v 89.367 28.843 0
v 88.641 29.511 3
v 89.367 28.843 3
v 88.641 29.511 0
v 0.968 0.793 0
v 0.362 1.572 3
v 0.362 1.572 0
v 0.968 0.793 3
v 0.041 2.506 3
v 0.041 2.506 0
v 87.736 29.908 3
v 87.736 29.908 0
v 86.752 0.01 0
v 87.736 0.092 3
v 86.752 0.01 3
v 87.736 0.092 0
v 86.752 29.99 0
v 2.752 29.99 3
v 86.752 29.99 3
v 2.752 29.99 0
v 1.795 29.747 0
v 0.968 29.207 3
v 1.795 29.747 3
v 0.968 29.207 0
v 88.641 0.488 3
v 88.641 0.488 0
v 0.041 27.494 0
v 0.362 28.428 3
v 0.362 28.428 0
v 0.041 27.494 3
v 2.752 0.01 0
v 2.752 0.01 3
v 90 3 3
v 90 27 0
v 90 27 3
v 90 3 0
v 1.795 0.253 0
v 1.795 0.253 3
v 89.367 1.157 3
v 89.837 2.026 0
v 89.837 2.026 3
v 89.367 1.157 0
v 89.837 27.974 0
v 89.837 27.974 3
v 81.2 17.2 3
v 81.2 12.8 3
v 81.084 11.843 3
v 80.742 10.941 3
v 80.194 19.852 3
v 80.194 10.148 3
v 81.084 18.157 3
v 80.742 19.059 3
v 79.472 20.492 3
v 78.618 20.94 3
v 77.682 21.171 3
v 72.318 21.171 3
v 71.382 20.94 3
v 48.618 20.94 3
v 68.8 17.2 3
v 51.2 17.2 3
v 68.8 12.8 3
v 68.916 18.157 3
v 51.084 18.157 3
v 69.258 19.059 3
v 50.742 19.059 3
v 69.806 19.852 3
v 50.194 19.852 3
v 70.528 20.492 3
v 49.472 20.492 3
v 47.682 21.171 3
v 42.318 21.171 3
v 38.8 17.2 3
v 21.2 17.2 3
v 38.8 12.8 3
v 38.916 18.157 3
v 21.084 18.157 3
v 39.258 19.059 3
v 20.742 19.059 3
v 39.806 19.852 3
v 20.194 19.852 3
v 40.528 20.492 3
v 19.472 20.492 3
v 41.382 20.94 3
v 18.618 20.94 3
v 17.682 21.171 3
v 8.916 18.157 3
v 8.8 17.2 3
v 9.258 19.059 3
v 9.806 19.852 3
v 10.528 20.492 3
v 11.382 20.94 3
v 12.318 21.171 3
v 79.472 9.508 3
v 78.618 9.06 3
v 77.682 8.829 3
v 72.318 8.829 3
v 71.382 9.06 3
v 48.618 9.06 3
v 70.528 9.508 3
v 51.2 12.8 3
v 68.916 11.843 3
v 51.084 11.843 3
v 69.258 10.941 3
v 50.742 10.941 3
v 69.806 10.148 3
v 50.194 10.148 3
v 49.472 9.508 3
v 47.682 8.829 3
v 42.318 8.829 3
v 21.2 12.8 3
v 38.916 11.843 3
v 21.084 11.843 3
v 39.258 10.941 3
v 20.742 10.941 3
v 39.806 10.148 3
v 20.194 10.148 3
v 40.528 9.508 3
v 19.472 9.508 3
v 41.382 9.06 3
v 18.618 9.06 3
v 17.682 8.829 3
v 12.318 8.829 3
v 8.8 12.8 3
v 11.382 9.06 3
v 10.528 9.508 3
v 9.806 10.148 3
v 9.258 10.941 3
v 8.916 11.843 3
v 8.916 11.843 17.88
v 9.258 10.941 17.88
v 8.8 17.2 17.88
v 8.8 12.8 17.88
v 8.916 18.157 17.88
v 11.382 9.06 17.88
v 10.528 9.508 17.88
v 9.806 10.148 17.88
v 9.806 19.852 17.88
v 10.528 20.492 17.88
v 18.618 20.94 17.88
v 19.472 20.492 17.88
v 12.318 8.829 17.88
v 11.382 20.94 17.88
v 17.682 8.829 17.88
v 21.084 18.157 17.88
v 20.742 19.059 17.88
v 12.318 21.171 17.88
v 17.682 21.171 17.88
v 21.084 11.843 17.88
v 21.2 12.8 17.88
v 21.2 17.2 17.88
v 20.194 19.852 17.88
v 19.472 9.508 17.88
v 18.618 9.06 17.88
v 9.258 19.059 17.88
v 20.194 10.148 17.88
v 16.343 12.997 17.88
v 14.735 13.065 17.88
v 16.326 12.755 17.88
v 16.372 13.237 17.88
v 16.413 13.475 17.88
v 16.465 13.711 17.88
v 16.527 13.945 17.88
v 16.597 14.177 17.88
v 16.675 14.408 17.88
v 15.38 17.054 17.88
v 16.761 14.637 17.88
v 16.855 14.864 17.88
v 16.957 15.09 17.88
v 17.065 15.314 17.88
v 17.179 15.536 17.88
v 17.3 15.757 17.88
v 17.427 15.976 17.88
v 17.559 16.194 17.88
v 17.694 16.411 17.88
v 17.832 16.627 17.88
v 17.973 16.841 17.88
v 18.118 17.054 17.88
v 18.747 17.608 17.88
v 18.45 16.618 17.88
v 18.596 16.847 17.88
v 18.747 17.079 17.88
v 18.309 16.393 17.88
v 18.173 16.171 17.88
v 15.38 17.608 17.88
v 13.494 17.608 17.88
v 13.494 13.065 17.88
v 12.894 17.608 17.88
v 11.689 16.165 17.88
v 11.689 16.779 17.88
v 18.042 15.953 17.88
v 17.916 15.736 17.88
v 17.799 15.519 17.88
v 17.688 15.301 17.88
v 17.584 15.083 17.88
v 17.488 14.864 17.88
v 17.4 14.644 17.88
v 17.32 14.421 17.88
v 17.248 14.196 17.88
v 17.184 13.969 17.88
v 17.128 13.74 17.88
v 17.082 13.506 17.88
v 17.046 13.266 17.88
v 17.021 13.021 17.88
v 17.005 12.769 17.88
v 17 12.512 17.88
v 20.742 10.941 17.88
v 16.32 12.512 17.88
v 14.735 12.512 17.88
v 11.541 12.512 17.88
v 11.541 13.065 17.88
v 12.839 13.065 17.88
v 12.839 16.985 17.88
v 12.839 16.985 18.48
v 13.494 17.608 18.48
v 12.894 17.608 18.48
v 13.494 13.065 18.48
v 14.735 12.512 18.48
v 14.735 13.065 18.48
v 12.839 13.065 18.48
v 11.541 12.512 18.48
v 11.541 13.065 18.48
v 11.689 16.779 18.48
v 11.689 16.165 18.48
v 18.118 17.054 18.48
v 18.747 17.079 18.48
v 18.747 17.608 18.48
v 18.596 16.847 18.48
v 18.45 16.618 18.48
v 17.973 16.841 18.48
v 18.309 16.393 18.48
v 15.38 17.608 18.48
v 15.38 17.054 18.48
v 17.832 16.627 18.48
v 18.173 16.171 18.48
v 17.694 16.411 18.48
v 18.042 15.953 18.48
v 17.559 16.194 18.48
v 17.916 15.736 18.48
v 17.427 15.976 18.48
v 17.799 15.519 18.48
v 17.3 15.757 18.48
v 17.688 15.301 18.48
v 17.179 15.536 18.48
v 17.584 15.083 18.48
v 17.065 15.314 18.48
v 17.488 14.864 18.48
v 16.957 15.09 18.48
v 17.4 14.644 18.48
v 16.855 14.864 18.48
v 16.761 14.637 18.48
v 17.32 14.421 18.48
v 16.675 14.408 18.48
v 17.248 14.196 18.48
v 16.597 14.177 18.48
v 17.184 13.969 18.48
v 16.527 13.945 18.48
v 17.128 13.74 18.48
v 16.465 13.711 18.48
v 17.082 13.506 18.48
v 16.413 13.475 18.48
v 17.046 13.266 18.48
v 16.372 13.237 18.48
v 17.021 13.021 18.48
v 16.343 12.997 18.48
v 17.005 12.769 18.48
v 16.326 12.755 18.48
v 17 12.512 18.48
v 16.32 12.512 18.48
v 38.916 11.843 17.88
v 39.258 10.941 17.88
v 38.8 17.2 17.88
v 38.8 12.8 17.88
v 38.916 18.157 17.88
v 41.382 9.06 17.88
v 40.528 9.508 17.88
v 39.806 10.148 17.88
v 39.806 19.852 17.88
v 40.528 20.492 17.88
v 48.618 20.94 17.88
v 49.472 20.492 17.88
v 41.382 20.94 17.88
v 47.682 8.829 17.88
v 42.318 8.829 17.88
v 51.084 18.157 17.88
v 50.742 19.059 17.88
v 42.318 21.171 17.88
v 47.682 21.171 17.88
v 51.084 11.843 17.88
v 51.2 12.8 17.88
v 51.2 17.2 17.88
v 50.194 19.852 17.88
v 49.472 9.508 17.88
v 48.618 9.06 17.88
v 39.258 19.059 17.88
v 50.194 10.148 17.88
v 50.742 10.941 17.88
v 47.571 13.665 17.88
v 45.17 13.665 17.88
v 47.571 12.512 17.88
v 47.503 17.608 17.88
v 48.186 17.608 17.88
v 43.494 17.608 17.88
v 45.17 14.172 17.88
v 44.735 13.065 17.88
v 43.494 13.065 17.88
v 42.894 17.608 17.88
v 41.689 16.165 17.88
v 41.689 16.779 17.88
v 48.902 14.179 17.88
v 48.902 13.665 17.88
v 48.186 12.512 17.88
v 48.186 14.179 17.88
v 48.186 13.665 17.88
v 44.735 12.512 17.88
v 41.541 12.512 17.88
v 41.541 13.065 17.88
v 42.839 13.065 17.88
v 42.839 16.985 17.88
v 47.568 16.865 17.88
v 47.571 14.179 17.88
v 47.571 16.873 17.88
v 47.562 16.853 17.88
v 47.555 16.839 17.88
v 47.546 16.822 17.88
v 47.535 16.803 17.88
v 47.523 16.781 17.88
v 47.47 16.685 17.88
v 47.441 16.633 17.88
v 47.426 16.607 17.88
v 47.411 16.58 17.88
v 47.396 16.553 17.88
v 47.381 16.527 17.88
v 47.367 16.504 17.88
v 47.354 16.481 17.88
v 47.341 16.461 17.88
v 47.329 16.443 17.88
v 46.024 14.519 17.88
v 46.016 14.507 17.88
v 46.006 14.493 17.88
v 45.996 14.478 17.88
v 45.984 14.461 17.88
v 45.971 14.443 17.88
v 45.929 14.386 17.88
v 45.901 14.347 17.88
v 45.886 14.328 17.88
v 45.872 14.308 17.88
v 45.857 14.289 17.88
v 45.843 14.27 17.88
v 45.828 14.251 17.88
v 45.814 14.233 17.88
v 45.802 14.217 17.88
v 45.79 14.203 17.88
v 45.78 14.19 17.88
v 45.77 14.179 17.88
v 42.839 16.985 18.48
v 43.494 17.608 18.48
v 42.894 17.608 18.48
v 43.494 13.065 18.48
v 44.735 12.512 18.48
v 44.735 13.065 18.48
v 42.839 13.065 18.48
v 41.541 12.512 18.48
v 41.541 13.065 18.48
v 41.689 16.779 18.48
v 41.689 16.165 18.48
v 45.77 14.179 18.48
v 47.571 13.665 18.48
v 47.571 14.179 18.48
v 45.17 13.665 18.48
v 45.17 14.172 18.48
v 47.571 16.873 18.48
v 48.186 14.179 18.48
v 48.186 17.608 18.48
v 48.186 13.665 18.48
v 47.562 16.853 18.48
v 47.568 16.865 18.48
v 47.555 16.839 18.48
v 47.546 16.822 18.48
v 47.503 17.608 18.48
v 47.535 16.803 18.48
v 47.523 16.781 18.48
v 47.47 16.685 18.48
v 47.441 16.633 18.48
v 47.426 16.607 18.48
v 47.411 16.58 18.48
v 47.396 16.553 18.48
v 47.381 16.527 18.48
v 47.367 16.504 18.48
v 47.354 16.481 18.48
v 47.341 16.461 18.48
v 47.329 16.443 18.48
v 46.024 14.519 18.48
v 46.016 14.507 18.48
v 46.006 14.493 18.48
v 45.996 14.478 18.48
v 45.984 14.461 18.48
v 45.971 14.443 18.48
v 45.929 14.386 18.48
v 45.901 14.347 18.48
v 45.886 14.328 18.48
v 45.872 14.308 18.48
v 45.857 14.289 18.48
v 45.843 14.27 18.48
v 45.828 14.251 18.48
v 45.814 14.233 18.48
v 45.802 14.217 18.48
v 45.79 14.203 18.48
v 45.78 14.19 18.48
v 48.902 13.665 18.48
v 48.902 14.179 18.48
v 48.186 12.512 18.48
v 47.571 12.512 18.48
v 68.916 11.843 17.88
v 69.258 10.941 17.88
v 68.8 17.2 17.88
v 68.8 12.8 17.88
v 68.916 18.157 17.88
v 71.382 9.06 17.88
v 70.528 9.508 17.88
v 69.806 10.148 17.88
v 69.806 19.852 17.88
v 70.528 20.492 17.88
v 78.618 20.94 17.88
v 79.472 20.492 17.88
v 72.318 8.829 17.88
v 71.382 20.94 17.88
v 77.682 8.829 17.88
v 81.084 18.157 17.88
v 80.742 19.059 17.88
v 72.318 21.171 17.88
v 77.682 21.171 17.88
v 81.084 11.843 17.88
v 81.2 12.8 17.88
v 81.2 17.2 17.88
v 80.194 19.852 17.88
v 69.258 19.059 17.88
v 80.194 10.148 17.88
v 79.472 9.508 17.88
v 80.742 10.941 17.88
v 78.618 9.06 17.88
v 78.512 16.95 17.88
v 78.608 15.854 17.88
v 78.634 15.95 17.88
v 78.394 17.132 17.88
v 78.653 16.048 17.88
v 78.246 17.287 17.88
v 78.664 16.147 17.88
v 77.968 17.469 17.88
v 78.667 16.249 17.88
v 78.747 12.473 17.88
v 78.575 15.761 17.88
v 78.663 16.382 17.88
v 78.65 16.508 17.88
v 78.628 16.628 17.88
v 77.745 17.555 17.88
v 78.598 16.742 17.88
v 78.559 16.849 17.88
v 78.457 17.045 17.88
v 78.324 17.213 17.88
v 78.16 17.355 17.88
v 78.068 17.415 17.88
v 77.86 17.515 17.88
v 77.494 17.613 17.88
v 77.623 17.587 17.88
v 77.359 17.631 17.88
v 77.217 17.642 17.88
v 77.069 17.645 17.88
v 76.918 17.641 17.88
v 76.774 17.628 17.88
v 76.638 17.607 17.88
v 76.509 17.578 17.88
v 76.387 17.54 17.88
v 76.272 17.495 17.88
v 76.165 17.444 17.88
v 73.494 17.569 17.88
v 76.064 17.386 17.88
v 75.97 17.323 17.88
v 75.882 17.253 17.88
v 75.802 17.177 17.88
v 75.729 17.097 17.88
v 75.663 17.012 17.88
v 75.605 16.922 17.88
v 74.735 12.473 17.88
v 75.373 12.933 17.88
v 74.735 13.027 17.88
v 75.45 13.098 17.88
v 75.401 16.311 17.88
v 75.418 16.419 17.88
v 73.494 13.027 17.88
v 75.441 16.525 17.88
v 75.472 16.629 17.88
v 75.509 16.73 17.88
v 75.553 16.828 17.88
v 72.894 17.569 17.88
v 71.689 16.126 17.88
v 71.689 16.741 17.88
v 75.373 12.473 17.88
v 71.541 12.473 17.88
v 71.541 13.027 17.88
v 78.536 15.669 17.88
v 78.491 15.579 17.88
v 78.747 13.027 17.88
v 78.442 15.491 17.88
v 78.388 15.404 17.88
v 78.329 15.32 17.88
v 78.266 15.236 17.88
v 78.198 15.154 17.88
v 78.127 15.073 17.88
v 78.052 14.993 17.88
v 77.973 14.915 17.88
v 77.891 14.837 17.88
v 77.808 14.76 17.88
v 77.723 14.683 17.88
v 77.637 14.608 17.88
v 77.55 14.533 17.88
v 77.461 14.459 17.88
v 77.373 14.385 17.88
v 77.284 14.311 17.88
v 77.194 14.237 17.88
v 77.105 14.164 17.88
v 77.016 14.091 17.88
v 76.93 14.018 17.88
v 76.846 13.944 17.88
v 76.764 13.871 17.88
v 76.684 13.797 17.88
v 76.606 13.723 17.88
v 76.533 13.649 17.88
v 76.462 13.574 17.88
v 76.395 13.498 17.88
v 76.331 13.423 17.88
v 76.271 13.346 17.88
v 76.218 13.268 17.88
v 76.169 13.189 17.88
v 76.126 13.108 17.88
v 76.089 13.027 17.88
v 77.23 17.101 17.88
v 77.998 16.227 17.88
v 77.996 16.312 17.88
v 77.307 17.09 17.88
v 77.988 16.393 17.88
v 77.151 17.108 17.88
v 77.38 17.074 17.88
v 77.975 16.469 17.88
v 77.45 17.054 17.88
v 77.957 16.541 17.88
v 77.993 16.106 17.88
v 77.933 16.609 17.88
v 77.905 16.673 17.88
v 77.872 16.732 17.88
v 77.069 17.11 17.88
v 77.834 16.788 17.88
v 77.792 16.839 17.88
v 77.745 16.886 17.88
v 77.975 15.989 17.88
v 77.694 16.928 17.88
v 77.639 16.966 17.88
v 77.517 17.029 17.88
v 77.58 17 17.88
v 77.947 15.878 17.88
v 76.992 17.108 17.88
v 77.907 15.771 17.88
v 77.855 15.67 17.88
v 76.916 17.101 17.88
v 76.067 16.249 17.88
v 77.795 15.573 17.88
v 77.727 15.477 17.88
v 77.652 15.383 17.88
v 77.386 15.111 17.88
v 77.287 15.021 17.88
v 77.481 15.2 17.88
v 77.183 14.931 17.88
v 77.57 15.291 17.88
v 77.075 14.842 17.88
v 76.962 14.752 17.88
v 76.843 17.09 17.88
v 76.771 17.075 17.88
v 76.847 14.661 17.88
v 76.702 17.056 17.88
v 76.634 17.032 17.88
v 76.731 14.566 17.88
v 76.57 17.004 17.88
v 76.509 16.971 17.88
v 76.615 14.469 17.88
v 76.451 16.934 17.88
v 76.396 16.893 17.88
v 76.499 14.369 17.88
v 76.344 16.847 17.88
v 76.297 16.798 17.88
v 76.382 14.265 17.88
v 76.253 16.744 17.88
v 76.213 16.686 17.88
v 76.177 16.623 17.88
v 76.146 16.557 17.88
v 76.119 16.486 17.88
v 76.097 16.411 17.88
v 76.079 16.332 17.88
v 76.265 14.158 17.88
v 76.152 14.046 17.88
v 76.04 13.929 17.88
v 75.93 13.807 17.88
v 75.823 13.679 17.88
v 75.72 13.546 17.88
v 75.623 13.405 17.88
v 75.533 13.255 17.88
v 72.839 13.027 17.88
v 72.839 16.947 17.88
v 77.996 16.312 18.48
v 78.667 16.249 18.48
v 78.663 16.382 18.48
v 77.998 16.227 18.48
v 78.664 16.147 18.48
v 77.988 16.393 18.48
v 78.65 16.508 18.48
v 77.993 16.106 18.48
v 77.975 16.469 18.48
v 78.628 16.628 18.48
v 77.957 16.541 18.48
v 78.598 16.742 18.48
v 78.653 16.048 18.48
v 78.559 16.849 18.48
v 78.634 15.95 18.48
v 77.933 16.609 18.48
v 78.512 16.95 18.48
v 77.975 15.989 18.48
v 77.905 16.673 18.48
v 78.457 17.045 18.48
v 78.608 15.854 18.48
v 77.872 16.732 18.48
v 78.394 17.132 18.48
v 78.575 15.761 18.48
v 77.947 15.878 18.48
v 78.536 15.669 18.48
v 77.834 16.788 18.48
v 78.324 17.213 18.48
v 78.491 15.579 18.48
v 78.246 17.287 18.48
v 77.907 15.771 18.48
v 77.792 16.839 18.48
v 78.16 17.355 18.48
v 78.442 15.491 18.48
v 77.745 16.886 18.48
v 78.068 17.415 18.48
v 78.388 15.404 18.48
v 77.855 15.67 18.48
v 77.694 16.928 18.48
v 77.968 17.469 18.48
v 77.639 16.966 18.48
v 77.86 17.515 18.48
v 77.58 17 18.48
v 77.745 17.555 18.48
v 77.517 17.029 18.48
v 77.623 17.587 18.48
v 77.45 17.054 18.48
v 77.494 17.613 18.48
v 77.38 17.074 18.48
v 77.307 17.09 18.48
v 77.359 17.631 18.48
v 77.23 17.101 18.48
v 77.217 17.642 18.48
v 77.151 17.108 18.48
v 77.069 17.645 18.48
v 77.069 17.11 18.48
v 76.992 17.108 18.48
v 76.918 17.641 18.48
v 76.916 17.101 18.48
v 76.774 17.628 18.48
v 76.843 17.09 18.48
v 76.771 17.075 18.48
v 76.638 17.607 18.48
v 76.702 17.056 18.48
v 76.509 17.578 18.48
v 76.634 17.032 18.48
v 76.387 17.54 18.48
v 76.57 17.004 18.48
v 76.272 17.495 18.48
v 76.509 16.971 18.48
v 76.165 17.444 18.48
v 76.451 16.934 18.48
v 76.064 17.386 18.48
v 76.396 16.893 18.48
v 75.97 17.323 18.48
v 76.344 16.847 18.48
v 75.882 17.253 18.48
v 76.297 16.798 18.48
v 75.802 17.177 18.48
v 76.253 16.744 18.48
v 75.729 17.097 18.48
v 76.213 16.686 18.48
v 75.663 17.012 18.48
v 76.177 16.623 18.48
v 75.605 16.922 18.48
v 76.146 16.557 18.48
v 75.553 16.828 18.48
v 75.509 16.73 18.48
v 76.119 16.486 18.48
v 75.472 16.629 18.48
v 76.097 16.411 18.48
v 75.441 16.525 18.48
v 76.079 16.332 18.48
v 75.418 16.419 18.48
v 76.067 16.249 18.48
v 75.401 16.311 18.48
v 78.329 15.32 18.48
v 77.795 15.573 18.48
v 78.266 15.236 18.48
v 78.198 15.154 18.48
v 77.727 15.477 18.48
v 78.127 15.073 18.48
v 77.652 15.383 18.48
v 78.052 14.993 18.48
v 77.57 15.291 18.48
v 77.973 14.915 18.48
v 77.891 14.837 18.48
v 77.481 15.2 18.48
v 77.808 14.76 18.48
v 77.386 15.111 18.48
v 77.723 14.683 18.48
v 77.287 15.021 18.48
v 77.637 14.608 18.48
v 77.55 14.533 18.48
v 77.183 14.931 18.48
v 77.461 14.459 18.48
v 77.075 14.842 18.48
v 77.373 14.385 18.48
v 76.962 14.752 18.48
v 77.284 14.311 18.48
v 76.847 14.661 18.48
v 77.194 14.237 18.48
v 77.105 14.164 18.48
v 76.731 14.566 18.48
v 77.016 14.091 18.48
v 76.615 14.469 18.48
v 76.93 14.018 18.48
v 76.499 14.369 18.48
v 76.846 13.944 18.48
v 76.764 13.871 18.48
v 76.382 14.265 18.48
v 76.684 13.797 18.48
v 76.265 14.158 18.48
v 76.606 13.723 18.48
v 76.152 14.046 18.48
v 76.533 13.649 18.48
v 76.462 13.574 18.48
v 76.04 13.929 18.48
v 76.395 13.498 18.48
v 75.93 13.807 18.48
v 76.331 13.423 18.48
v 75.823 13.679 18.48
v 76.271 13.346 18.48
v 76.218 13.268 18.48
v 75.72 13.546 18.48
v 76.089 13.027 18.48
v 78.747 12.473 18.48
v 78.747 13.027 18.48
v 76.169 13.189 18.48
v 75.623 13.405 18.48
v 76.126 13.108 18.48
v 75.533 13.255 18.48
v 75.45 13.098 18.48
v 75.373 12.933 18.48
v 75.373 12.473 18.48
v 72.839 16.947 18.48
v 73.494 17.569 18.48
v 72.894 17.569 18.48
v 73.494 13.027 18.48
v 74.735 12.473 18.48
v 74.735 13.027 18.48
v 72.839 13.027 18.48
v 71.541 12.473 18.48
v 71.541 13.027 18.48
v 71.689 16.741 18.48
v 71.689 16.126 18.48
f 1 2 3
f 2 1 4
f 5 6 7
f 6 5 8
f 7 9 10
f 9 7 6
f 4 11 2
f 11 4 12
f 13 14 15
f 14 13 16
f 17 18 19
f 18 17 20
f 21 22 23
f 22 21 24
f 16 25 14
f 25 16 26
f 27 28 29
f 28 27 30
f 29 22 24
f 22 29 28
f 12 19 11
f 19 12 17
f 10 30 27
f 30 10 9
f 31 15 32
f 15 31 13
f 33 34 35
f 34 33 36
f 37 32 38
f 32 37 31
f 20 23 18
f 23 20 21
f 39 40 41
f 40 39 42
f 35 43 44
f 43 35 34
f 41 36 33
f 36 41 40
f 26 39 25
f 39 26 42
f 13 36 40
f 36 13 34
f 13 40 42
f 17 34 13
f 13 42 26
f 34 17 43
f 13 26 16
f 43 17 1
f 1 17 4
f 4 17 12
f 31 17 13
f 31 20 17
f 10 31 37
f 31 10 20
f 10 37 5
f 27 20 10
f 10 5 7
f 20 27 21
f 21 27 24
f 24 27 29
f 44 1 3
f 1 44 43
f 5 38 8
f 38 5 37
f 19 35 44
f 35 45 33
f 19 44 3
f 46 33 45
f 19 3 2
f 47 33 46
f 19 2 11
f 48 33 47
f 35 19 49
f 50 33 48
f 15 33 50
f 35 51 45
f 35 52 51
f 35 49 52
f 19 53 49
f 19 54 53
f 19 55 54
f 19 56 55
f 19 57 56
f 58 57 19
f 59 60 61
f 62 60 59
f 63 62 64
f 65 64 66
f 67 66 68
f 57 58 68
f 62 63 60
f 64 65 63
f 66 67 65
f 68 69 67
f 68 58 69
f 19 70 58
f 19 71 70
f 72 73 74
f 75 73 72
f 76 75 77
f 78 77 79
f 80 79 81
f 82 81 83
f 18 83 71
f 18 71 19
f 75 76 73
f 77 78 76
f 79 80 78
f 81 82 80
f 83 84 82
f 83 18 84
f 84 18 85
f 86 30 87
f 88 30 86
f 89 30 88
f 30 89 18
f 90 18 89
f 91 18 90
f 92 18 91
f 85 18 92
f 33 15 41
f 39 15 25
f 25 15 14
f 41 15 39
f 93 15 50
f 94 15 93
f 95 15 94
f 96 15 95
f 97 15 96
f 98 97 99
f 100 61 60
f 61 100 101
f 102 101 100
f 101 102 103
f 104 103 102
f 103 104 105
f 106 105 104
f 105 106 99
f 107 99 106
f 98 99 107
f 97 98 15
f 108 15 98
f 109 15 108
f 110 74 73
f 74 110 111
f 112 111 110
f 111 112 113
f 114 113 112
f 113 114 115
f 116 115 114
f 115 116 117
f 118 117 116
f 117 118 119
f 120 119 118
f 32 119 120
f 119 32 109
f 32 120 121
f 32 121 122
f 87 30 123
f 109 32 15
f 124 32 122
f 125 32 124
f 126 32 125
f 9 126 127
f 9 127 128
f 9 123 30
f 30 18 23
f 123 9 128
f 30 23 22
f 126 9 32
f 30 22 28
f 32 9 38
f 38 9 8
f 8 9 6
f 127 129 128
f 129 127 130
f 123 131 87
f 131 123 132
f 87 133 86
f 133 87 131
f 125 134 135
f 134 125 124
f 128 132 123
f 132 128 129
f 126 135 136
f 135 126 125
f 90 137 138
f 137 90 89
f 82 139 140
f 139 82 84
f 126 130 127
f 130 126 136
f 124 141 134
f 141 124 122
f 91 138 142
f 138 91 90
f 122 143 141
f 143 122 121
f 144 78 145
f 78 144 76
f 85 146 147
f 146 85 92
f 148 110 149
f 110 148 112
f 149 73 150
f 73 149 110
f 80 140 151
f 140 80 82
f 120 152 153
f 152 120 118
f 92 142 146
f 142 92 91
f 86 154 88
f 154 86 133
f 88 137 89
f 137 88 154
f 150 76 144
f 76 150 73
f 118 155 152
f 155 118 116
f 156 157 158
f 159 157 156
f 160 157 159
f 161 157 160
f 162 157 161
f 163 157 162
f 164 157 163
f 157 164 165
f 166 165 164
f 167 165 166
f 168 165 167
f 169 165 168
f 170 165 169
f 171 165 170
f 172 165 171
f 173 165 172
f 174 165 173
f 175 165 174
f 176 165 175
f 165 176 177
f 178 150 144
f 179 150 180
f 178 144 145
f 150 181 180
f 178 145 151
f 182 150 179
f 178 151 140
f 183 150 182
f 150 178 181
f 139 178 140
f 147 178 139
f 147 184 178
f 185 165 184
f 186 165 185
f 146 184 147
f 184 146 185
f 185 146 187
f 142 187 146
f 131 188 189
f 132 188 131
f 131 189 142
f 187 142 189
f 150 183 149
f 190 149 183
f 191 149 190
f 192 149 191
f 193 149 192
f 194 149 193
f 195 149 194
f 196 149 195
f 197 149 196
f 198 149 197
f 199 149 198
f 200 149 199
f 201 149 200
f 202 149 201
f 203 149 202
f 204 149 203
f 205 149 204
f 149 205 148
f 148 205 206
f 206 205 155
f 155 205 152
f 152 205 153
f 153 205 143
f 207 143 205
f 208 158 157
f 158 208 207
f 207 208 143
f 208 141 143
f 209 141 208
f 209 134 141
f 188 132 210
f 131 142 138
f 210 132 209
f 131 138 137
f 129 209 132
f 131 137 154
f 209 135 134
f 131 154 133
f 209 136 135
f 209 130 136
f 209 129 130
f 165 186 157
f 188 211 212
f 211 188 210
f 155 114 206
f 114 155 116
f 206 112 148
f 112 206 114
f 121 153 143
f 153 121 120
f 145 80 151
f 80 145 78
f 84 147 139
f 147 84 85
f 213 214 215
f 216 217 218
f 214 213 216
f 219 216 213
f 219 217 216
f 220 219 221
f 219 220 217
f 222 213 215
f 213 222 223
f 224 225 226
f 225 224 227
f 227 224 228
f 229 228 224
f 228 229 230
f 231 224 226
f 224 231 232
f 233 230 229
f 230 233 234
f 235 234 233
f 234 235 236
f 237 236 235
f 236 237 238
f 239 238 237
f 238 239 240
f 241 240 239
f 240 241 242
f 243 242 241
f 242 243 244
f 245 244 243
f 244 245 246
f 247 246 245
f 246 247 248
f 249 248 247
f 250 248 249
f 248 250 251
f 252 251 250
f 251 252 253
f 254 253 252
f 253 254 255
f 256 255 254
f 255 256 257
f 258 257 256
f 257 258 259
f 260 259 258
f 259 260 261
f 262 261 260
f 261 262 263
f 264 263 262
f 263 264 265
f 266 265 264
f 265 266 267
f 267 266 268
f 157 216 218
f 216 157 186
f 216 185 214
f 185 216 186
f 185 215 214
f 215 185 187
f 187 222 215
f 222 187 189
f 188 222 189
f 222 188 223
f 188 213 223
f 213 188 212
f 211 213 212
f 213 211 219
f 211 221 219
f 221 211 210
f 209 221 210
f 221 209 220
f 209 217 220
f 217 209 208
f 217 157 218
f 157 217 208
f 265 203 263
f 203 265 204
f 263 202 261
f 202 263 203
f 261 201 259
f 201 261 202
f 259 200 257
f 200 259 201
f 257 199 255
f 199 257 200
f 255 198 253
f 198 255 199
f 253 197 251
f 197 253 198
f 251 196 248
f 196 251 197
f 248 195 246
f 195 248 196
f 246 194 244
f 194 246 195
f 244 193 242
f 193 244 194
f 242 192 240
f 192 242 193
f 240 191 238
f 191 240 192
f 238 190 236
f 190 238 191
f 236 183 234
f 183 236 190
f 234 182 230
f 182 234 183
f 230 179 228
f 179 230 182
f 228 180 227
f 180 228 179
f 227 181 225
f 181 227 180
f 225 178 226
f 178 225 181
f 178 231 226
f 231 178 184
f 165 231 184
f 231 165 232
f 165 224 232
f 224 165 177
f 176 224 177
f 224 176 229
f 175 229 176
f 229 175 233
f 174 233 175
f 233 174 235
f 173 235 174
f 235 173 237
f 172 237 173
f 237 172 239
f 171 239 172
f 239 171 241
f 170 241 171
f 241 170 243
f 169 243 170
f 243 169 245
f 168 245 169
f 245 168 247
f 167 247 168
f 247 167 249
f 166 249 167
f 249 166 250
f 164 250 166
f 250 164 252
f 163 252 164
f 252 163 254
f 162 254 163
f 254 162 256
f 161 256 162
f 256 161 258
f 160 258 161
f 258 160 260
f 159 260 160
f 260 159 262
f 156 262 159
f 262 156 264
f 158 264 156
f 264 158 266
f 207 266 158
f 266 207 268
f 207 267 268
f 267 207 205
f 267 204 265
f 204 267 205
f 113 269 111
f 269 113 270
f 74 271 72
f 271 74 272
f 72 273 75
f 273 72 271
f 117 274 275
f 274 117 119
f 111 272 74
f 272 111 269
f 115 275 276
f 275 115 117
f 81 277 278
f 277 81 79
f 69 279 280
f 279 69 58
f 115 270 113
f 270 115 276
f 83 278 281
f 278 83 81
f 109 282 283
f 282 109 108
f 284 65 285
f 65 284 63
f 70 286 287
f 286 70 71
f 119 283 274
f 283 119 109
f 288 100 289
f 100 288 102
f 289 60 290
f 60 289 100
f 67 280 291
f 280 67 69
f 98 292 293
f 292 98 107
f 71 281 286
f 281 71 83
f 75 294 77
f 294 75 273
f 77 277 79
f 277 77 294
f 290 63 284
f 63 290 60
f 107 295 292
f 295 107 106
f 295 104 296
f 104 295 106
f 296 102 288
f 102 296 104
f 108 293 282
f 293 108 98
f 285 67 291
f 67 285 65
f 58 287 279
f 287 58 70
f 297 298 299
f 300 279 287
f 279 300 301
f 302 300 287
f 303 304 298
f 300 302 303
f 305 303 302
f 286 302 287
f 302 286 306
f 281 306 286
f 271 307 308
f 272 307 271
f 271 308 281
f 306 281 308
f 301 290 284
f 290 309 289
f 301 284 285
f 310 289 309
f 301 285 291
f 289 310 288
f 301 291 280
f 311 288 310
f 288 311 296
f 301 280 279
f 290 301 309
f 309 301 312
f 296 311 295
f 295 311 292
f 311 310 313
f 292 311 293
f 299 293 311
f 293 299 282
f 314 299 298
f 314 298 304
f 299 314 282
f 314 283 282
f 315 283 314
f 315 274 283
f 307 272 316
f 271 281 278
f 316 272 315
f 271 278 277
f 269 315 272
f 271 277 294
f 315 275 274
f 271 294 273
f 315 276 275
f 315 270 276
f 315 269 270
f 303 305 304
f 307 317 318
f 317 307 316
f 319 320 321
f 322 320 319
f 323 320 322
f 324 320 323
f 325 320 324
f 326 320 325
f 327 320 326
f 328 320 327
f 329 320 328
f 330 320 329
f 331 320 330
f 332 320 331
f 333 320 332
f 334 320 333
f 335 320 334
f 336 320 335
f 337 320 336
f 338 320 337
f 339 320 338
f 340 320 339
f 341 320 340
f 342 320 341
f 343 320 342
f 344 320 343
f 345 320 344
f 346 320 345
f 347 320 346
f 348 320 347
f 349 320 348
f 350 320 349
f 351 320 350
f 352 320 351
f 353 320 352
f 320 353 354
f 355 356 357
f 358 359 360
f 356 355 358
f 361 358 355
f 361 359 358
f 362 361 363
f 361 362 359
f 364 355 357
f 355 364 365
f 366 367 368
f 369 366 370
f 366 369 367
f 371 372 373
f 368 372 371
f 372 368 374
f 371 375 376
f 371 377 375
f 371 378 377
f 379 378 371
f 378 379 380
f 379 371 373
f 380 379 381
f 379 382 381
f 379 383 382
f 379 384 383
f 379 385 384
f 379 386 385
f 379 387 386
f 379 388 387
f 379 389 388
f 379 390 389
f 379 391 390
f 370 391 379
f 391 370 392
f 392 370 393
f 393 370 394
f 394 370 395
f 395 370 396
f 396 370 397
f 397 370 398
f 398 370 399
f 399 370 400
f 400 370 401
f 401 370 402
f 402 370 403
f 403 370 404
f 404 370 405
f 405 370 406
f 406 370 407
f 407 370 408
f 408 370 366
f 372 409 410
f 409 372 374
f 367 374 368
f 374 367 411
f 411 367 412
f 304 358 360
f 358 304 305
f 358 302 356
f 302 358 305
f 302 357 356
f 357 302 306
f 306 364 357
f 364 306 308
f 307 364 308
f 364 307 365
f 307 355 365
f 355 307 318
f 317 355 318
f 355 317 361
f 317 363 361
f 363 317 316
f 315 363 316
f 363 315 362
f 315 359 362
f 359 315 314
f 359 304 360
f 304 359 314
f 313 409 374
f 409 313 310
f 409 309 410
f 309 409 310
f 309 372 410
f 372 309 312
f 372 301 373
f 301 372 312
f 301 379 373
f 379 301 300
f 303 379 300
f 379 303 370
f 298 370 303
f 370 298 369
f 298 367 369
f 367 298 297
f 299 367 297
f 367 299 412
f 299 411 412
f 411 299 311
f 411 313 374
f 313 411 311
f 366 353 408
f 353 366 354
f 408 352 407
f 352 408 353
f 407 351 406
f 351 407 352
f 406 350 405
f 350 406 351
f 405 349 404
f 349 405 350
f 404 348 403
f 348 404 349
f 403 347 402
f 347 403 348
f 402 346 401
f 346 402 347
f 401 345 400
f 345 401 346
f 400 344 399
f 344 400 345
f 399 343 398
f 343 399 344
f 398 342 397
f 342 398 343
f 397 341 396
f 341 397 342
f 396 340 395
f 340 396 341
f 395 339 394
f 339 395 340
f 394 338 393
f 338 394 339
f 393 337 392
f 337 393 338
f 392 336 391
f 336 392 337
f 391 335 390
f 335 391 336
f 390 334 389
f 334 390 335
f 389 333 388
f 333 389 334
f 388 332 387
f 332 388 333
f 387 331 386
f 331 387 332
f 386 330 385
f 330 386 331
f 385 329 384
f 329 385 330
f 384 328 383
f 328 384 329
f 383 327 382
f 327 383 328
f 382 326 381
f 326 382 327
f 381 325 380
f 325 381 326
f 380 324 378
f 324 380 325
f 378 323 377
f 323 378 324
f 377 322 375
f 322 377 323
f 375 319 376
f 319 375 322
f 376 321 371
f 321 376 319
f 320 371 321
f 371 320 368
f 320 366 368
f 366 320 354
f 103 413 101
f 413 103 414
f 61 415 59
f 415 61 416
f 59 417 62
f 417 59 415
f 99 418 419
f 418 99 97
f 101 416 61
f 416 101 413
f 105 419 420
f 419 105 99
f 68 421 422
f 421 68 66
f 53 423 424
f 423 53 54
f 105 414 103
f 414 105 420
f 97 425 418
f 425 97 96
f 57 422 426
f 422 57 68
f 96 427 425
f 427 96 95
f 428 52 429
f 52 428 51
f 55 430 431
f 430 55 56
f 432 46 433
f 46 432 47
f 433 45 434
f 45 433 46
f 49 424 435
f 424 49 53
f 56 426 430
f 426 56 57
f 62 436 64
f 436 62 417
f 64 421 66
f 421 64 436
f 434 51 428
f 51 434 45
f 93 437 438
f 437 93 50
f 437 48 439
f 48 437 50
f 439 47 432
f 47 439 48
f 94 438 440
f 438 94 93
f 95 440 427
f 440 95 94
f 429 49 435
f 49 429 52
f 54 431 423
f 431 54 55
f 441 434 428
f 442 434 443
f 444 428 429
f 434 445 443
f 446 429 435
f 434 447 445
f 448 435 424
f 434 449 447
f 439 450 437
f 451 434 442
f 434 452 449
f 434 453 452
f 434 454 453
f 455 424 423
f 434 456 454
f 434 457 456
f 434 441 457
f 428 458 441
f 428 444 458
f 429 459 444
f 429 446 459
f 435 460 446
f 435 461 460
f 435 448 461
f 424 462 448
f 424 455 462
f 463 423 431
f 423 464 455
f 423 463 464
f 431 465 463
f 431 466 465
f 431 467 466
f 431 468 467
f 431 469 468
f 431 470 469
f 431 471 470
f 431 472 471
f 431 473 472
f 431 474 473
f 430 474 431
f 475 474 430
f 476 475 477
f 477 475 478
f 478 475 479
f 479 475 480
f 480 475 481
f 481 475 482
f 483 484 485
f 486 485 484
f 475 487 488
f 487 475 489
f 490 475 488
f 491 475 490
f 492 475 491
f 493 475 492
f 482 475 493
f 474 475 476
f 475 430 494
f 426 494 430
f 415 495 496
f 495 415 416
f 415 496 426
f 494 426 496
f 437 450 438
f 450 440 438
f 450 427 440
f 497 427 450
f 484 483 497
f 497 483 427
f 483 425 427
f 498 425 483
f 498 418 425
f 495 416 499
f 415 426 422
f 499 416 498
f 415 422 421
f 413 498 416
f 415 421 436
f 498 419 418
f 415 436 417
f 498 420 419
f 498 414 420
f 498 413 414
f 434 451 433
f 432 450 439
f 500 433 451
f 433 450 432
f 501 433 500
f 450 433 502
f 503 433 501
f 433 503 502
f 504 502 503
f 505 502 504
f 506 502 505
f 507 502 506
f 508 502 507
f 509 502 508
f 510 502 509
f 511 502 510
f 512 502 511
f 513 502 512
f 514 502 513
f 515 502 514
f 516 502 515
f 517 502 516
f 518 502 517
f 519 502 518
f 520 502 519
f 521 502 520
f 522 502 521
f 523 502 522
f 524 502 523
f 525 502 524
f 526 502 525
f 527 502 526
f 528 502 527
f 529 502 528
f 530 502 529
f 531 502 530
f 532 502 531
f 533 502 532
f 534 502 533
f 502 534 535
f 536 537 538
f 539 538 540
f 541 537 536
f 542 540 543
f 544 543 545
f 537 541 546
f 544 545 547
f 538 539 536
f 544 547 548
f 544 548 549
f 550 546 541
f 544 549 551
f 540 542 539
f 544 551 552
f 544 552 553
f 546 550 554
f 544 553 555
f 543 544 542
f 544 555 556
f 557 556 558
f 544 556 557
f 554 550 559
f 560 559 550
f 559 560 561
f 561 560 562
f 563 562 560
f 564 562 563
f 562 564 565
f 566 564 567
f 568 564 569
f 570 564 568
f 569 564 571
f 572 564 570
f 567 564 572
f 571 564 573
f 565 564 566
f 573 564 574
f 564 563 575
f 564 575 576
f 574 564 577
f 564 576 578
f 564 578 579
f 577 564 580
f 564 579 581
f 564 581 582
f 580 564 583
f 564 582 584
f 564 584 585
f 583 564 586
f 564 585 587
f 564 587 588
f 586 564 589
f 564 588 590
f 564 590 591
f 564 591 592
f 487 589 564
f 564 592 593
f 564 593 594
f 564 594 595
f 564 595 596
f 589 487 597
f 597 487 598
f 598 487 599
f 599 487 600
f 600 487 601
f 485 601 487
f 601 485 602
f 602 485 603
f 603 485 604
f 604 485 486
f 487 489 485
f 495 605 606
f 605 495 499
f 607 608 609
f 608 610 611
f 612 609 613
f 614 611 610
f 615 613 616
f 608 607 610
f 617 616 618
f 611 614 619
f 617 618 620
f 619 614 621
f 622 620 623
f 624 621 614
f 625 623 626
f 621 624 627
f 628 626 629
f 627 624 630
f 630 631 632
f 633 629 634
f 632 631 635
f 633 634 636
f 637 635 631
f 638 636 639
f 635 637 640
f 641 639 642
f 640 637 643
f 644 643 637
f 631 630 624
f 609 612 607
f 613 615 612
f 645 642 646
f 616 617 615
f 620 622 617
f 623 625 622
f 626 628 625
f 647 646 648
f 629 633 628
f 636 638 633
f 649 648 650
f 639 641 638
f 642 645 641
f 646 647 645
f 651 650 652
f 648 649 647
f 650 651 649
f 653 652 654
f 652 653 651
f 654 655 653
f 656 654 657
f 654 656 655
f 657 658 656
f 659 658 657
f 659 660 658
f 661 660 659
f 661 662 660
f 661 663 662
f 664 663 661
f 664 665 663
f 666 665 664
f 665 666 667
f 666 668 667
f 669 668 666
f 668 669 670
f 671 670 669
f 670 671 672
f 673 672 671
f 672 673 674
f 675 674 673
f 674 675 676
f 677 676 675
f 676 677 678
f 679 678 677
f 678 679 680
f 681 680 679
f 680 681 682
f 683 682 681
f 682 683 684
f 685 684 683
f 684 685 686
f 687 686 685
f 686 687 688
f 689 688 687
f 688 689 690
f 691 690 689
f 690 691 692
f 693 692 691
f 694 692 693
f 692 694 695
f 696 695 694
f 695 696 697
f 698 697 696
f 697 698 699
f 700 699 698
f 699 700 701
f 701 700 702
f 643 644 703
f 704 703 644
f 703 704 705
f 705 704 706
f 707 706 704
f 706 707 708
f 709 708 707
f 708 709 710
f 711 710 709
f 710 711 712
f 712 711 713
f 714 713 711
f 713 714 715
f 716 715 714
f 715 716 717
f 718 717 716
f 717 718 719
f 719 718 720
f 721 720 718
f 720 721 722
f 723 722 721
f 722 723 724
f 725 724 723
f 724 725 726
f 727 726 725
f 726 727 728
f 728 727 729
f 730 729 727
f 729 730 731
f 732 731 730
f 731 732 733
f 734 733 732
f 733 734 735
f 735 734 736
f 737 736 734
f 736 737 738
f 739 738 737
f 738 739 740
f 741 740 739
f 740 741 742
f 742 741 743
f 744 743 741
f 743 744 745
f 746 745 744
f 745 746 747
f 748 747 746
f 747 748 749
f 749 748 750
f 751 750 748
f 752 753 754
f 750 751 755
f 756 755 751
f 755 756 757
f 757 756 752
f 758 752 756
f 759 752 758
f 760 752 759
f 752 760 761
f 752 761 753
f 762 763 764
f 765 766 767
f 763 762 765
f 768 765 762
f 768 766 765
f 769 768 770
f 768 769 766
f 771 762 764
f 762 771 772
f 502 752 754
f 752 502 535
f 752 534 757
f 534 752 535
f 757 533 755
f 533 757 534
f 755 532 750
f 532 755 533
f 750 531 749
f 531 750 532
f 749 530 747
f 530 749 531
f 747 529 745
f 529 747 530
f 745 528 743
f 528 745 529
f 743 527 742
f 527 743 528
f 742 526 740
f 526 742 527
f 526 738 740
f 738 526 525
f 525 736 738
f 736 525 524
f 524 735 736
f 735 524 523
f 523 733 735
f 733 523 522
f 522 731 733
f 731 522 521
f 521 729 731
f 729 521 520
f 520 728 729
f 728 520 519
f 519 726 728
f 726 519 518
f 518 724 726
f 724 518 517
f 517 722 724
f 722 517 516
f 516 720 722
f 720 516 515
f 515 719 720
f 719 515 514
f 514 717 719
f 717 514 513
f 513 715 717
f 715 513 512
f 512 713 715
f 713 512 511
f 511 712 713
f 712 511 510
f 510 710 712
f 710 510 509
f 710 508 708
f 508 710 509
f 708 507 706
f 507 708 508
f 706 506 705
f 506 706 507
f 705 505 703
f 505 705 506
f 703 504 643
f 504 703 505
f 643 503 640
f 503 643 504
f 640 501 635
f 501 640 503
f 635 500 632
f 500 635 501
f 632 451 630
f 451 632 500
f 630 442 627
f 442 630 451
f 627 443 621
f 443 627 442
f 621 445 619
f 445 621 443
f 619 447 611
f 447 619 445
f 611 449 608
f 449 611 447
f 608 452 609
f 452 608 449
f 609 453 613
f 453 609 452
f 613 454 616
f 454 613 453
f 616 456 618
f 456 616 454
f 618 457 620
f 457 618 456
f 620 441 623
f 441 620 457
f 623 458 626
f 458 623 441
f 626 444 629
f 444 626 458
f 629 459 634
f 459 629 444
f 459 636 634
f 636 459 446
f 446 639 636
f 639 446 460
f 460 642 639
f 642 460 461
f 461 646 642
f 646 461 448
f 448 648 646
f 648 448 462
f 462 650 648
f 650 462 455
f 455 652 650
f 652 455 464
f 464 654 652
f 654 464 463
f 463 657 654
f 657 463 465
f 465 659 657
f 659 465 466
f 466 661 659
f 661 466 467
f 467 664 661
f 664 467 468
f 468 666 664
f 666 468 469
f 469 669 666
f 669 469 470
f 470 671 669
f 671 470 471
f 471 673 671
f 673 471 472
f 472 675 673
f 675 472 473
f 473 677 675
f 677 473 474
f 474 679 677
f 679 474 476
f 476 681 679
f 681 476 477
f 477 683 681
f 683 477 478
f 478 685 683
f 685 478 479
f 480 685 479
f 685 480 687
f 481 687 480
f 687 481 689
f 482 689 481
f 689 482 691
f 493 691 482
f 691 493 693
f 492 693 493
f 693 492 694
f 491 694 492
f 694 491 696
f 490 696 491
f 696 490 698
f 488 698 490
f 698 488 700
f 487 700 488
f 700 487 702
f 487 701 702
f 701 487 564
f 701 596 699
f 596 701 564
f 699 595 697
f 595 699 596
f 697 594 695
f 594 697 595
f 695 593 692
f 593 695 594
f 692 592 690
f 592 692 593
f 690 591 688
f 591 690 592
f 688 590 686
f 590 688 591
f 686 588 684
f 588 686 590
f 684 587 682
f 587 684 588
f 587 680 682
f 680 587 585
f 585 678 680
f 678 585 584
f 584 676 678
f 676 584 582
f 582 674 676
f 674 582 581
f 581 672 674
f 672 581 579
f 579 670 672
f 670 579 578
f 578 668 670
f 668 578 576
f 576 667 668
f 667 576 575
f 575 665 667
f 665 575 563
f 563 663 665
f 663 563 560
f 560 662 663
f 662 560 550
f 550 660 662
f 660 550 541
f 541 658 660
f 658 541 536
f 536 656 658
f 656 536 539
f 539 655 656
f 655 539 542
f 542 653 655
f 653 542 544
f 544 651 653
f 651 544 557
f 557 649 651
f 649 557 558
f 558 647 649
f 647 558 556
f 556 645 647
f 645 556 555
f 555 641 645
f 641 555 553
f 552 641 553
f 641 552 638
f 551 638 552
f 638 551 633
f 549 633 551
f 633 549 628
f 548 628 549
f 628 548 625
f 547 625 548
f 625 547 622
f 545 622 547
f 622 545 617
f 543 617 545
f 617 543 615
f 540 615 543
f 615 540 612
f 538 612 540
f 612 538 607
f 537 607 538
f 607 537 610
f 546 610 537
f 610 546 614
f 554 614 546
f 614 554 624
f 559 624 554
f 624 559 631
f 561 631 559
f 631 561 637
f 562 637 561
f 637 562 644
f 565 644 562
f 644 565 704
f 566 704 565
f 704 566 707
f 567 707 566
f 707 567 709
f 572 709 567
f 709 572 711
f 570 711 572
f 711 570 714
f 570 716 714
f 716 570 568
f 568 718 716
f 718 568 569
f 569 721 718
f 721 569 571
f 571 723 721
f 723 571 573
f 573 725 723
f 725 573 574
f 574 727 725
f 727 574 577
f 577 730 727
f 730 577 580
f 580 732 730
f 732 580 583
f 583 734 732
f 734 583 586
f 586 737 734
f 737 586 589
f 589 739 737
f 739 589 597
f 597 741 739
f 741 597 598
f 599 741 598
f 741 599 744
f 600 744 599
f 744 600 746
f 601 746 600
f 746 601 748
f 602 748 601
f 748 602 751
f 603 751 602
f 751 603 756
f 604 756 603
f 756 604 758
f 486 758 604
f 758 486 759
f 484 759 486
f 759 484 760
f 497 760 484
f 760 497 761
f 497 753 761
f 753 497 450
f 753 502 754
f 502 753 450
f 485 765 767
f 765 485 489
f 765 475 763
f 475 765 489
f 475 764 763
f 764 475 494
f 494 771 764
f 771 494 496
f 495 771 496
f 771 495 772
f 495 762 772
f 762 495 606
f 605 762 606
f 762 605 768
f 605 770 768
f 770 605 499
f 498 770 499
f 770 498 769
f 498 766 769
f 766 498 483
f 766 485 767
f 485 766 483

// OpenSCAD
// https://www.thingiverse.com/thing:892317

/* [Hidden] */
$fa = 2;
$fs = 1;

/* [Original Parameters]
//Drive size
drive_size = 3; // [2:1/4,3:3/8,4:1/2]

//The center to center spacing of recepticles
spacing = 30;
//how many rows of sockets?
rows = 3;
//how many columns of sockets?
cols = 2;
//adjust this up if the sockets fit too tight
clearance = 0.3;
//list the socket labels.  Note: right now the customizer only accepts numbers.  sorry :(
txt = ["10","8","7","6","5","4"];
 
//Add a tab with text label below sockets (empty for no tab).
label_text = "Metric Hex Bits";

//END PARAMETERS//
/* [Hidden] */

clearance = 0.3;
nib_text_size_multiplier = 4;

/* [Metric Half Inch Drive Hex] */
drive_size = 4;
spacing = 30;
rows = 3;
cols = 1;
txt = ["17", "14", "12"];
label_text = "";

/* [Metric Three Eigths Drive Hex]
drive_size = 3;
spacing = 30;
rows = 3;
cols = 2;
txt = ["10","8","7","6","5","4"];
label_text = "Metric Hex Bits";
/*


/* [SAE Three Eigths Drive Hex]
drive_size = 3;
spacing = 30;
rows = 3;
cols = 2;
txt = ["3/8","5/16","1/4","7/32","3/16","5/32"];
label_text = "SAE Hex Bits";
nib_text_size_multiplier = 3;
*/

nib_size = drive_size/8*25.4-clearance;
nib_height = 1.2*nib_size;

basethickness = 3;
letter_depth = 0.6;

label_size = 2*4*drive_size/3;

difference() {
  if (label_text != ""){ 
    translate([0,-label_size,0])
    rRect([spacing*(rows),spacing*(cols)+label_size,basethickness],3);
  } else {
    rRect([spacing*(rows),spacing*(cols),basethickness],3);
  }
  translate([spacing*(rows)/2,-4*drive_size/3,basethickness-letter_depth/2])
  linear_extrude(letter_depth+0.1)
  text(label_text,size=4*drive_size/3,font= "Arial:style=Black",valign="center",
            halign="center");
}

for (r = [0.5:1:rows]) {
  for (c = [0.5:1:cols]) {
    difference() {
      translate([r*spacing,c*spacing,basethickness+nib_height/2])
        rRect([nib_size,nib_size,nib_height],drive_size,center = true);      
    }
    union() {
      translate([r*spacing,c*spacing,basethickness+nib_height])
        linear_extrude(letter_depth)
          text( str(txt[round((cols-1-(c-0.5))*rows+ (r-0.5))]),size=nib_text_size_multiplier*drive_size/3,font= "Arial:style=Black",valign="center",
            halign="center");
      }
  }
}


// rectangle with radiused cornerrs
// size - [x,y,z]
// r - radius
// center=false - center the object ar origin? (similar to cube)
module rRect(size, r, center = false)
{

  x = size[0];
  y = size[1];
  z = size[2];
  t = center?[-x/2,-y/2,-z/2]:[0,0,0];
  
  translate(t)
  linear_extrude(height=z)
        hull() {
            translate([r, r, 0])
                circle(r=r);
            translate([x-r, (r), 0])
                circle(r=r);
            translate([ r, y-r, 0])
                circle(r=r);
            translate([x-r, y-r, 0])
                circle(r=r);
        };
}


/*
linear_extrude(height=20)
text(str(7));
*/
